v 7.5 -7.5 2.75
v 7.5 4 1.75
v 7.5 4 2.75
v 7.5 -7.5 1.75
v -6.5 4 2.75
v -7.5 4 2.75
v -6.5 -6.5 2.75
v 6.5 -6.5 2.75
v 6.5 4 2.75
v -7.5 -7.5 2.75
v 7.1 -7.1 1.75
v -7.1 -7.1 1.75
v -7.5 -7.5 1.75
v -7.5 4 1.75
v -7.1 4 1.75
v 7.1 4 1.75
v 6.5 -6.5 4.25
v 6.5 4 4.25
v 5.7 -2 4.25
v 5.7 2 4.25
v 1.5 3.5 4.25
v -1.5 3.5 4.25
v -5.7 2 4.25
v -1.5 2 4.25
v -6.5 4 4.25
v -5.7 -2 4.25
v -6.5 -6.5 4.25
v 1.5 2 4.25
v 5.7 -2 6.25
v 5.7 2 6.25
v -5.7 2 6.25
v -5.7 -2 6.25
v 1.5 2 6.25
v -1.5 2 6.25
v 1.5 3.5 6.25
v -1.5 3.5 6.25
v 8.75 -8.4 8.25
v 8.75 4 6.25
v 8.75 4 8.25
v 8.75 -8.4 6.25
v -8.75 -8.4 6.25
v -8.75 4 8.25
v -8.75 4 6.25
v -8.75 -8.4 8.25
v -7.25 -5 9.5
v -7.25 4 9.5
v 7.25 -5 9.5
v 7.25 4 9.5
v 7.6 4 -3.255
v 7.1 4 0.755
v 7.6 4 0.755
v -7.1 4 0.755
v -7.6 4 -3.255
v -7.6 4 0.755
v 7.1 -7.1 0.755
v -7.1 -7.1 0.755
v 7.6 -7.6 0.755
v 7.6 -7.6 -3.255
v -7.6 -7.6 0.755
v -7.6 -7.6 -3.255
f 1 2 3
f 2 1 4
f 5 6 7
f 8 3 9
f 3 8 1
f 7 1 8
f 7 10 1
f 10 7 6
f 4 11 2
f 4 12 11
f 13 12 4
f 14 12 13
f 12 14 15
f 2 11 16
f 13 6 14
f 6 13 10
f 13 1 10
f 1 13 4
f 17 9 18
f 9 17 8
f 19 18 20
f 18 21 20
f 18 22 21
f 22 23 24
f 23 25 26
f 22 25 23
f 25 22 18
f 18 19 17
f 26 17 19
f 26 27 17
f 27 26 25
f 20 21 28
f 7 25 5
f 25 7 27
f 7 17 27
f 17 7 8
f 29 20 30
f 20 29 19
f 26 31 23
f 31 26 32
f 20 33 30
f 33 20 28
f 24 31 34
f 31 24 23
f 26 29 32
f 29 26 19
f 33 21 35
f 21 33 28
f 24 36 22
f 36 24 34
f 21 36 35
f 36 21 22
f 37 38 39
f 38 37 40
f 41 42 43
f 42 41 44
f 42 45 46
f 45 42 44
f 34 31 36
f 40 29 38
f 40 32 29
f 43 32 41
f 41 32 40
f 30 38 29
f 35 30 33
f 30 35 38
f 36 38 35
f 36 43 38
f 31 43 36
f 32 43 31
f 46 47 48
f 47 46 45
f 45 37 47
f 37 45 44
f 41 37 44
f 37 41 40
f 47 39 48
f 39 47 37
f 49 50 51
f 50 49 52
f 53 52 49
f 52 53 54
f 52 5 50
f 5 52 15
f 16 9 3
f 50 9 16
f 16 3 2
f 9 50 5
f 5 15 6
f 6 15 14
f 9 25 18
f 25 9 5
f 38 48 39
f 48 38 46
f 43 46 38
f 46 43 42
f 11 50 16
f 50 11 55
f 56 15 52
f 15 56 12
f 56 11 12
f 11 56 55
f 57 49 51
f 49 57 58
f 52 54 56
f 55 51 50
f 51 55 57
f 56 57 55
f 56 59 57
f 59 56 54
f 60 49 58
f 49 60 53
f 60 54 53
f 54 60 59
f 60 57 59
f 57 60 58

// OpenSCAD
plate_thickness = 1;
plate_size = 15.6;
edge_offset = 1;
bottom_height = 5;
bottom_size = plate_size - 2;

top_height = 11.6;

switch_height = 3.0;
switch_thick = 1;
switch_width = 5;
switch_length = 3;

cap_height = .38*25.4;
cap_heightShift = 0.69*25.4;
cap_width = 18.3;

clip_Length = 3;  // length clipped

//dummy key switch with caps to check position
module Switch(switchScale= [1,1,1], colors = "teal", clipLength = 0)
{
  difference(){
    union(){
      translate([0,0,1.75]){
        difference(){
          translate([0,0,0.5])cube([15,15,1], center = true);
          //cuts
      //    translate([15/2-1/2,0,.5])cube([1,10.5,2], center = true);
      //    translate([-15/2+1/2,0,.5])cube([1,10.5,2], center = true);
        }

        translate([0,0,1.5])cube([13,13,2], center = true);
        color("springGreen")translate([0,0,4])cube([11.4,4,3], center = true);
        color("springGreen")translate([0,1,4])cube([3,5,3], center = true);
        color("DarkSlateGray")translate([0,0,-1])cube([13,14,2,],center = true);
        color("DarkSlateGray")translate([0,0,-2-2.5])cylinder(d=3.3, 2.5);
        color("DarkSlateGray")translate([5,0,-2-2.5])cylinder(d=1.6, 2.5); 
        color("DarkSlateGray")translate([-5,0,-2-2.5])cylinder(d=1.6, 2.5); 

        //cap
        color("ivory")hull(){
          translate([0,0,4.5+1])cube([17.5,16.8,2],center = true);
          translate([0,1.25,4.5+1+1.5])cube([14.5,12.5,1.5],center = true);
        }
      }
    }
    if (clipLength != 0){ // commiting unholy act in name of ergonomics
      translate([0, -sign(clipLength)*7.8-clipLength,  0])cube([20, 15.6, 40], center = true);
    }
  }
}

module Cutter()
{
  bottom_height = 4.5;
  bottom_chamfer_width = 3;
  bottom_chamfer_height =  1;
  bottom_chamfer_thickness = .6;

  bottom_peg_diameter = 4;
  bottom_peg_height =  3;
  bottom_peg_chamfer = 1;
  bottom_peg_side_scale = 1.7/4;

  translate([-bottom_size/2, -bottom_size/2 ,0])cube([bottom_size,bottom_size,bottom_height]);

  translate([0,0, -(bottom_peg_height -bottom_peg_chamfer)]){
    cylinder(d=bottom_peg_diameter, h= bottom_peg_height -bottom_peg_chamfer);
    translate([5,0,0])scale(v=[bottom_peg_side_scale,bottom_peg_side_scale,1])cylinder(d=bottom_peg_diameter, h= bottom_peg_height -bottom_peg_chamfer);
    translate([-5,0,0])scale(v=[bottom_peg_side_scale,bottom_peg_side_scale,1])cylinder(d=bottom_peg_diameter, h= bottom_peg_height -bottom_peg_chamfer);

    translate([0,0, -bottom_peg_chamfer]){
      cylinder(d2=bottom_peg_diameter , d1 = bottom_peg_diameter -2*bottom_peg_chamfer, h= bottom_peg_chamfer);
      translate([5,0,0])scale(v=[bottom_peg_side_scale,bottom_peg_side_scale,1])cylinder(d2=bottom_peg_diameter , d1 = bottom_peg_diameter -2*bottom_peg_chamfer, h= bottom_peg_chamfer);
      translate([-5,0,0])scale(v=[bottom_peg_side_scale,bottom_peg_side_scale,1])cylinder(d2=bottom_peg_diameter , d1 = bottom_peg_diameter -2*bottom_peg_chamfer, h= bottom_peg_chamfer);
    }
  }
}

//MX series keyhole
// TODO: add alps support?
module Keyhole(tol = .1, cutThickness = .5, clipLength = 0)
{
  $fn = 10;
  bottom_length = 13.9+tol;
   plate_thickness = 3.51; //mm
  holeLength = bottom_length+tol*2;
  //latch nibs
  nib_radius= 1;
  nib_length = 3;

  translate([0,0,-1.25])difference(){
    union(){
      translate([0,0,1.25])cube([holeLength, holeLength, plate_thickness+tol], center =true);
      translate([0,0,.25-cutThickness/2])cube([holeLength+1, holeLength+1, plate_thickness+cutThickness], center =true);  
    }
    
    union(){
      if (clipLength != 0){
        translate([0, -sign(clipLength)*7.8-clipLength, 0])cube([20, 15.6, 40], center = true);
      }
    }
  }
}

module Stabilizer(offsets = 23.8/2)
{
  plate_thickness = 3.6; //mm
  stabilizer_width = 5;
  stabilizer_length = 12.2;
  translate([offsets,0,0])cube([stabilizer_width,stabilizer_length,plate_thickness], center = true);
  translate([-offsets,0,0])cube([stabilizer_width,stabilizer_length,plate_thickness], center = true);
}

module TrackPoint(nibLength = 20)
{
  color("red")translate([0,0,-.5])cube([4.5,4.5,5], center= true); //nib
  color("gold")cylinder(d = 2, nibLength); //nib
  color("gold")translate([0,0,nibLength])sphere(2); //nib
  translate([0,30.3/2-8,-3/2])cube([26.46, 30.3, 3], center = true);
}

module RotaryEncoder(stemLength = 13, Wheel = 0)
{
 color("grey")translate([0,0, -6.1/2])cube([11.5, 13.5, 6.1], center = true);
 cylinder(d = 7, 7.8);

 translate([0,0,7.8])difference(){
   cylinder(d = 5.8, stemLength);
   translate([-5.8/2,5.8/2-1.5,3])cube([11.5, 13.5, stemLength]);
 }
 color("grey")translate([0,0,7.8])cylinder(d = Wheel, stemLength);
}

//################ Test Calls ###################
Switch(clipLength = -4);
#Keyhole(.1, clipLength = -4);
//Stabilizer(20);
// RotaryEncoder(Wheel = 0);
//Switch([1,1.5,1]);
//TrackPoint();
